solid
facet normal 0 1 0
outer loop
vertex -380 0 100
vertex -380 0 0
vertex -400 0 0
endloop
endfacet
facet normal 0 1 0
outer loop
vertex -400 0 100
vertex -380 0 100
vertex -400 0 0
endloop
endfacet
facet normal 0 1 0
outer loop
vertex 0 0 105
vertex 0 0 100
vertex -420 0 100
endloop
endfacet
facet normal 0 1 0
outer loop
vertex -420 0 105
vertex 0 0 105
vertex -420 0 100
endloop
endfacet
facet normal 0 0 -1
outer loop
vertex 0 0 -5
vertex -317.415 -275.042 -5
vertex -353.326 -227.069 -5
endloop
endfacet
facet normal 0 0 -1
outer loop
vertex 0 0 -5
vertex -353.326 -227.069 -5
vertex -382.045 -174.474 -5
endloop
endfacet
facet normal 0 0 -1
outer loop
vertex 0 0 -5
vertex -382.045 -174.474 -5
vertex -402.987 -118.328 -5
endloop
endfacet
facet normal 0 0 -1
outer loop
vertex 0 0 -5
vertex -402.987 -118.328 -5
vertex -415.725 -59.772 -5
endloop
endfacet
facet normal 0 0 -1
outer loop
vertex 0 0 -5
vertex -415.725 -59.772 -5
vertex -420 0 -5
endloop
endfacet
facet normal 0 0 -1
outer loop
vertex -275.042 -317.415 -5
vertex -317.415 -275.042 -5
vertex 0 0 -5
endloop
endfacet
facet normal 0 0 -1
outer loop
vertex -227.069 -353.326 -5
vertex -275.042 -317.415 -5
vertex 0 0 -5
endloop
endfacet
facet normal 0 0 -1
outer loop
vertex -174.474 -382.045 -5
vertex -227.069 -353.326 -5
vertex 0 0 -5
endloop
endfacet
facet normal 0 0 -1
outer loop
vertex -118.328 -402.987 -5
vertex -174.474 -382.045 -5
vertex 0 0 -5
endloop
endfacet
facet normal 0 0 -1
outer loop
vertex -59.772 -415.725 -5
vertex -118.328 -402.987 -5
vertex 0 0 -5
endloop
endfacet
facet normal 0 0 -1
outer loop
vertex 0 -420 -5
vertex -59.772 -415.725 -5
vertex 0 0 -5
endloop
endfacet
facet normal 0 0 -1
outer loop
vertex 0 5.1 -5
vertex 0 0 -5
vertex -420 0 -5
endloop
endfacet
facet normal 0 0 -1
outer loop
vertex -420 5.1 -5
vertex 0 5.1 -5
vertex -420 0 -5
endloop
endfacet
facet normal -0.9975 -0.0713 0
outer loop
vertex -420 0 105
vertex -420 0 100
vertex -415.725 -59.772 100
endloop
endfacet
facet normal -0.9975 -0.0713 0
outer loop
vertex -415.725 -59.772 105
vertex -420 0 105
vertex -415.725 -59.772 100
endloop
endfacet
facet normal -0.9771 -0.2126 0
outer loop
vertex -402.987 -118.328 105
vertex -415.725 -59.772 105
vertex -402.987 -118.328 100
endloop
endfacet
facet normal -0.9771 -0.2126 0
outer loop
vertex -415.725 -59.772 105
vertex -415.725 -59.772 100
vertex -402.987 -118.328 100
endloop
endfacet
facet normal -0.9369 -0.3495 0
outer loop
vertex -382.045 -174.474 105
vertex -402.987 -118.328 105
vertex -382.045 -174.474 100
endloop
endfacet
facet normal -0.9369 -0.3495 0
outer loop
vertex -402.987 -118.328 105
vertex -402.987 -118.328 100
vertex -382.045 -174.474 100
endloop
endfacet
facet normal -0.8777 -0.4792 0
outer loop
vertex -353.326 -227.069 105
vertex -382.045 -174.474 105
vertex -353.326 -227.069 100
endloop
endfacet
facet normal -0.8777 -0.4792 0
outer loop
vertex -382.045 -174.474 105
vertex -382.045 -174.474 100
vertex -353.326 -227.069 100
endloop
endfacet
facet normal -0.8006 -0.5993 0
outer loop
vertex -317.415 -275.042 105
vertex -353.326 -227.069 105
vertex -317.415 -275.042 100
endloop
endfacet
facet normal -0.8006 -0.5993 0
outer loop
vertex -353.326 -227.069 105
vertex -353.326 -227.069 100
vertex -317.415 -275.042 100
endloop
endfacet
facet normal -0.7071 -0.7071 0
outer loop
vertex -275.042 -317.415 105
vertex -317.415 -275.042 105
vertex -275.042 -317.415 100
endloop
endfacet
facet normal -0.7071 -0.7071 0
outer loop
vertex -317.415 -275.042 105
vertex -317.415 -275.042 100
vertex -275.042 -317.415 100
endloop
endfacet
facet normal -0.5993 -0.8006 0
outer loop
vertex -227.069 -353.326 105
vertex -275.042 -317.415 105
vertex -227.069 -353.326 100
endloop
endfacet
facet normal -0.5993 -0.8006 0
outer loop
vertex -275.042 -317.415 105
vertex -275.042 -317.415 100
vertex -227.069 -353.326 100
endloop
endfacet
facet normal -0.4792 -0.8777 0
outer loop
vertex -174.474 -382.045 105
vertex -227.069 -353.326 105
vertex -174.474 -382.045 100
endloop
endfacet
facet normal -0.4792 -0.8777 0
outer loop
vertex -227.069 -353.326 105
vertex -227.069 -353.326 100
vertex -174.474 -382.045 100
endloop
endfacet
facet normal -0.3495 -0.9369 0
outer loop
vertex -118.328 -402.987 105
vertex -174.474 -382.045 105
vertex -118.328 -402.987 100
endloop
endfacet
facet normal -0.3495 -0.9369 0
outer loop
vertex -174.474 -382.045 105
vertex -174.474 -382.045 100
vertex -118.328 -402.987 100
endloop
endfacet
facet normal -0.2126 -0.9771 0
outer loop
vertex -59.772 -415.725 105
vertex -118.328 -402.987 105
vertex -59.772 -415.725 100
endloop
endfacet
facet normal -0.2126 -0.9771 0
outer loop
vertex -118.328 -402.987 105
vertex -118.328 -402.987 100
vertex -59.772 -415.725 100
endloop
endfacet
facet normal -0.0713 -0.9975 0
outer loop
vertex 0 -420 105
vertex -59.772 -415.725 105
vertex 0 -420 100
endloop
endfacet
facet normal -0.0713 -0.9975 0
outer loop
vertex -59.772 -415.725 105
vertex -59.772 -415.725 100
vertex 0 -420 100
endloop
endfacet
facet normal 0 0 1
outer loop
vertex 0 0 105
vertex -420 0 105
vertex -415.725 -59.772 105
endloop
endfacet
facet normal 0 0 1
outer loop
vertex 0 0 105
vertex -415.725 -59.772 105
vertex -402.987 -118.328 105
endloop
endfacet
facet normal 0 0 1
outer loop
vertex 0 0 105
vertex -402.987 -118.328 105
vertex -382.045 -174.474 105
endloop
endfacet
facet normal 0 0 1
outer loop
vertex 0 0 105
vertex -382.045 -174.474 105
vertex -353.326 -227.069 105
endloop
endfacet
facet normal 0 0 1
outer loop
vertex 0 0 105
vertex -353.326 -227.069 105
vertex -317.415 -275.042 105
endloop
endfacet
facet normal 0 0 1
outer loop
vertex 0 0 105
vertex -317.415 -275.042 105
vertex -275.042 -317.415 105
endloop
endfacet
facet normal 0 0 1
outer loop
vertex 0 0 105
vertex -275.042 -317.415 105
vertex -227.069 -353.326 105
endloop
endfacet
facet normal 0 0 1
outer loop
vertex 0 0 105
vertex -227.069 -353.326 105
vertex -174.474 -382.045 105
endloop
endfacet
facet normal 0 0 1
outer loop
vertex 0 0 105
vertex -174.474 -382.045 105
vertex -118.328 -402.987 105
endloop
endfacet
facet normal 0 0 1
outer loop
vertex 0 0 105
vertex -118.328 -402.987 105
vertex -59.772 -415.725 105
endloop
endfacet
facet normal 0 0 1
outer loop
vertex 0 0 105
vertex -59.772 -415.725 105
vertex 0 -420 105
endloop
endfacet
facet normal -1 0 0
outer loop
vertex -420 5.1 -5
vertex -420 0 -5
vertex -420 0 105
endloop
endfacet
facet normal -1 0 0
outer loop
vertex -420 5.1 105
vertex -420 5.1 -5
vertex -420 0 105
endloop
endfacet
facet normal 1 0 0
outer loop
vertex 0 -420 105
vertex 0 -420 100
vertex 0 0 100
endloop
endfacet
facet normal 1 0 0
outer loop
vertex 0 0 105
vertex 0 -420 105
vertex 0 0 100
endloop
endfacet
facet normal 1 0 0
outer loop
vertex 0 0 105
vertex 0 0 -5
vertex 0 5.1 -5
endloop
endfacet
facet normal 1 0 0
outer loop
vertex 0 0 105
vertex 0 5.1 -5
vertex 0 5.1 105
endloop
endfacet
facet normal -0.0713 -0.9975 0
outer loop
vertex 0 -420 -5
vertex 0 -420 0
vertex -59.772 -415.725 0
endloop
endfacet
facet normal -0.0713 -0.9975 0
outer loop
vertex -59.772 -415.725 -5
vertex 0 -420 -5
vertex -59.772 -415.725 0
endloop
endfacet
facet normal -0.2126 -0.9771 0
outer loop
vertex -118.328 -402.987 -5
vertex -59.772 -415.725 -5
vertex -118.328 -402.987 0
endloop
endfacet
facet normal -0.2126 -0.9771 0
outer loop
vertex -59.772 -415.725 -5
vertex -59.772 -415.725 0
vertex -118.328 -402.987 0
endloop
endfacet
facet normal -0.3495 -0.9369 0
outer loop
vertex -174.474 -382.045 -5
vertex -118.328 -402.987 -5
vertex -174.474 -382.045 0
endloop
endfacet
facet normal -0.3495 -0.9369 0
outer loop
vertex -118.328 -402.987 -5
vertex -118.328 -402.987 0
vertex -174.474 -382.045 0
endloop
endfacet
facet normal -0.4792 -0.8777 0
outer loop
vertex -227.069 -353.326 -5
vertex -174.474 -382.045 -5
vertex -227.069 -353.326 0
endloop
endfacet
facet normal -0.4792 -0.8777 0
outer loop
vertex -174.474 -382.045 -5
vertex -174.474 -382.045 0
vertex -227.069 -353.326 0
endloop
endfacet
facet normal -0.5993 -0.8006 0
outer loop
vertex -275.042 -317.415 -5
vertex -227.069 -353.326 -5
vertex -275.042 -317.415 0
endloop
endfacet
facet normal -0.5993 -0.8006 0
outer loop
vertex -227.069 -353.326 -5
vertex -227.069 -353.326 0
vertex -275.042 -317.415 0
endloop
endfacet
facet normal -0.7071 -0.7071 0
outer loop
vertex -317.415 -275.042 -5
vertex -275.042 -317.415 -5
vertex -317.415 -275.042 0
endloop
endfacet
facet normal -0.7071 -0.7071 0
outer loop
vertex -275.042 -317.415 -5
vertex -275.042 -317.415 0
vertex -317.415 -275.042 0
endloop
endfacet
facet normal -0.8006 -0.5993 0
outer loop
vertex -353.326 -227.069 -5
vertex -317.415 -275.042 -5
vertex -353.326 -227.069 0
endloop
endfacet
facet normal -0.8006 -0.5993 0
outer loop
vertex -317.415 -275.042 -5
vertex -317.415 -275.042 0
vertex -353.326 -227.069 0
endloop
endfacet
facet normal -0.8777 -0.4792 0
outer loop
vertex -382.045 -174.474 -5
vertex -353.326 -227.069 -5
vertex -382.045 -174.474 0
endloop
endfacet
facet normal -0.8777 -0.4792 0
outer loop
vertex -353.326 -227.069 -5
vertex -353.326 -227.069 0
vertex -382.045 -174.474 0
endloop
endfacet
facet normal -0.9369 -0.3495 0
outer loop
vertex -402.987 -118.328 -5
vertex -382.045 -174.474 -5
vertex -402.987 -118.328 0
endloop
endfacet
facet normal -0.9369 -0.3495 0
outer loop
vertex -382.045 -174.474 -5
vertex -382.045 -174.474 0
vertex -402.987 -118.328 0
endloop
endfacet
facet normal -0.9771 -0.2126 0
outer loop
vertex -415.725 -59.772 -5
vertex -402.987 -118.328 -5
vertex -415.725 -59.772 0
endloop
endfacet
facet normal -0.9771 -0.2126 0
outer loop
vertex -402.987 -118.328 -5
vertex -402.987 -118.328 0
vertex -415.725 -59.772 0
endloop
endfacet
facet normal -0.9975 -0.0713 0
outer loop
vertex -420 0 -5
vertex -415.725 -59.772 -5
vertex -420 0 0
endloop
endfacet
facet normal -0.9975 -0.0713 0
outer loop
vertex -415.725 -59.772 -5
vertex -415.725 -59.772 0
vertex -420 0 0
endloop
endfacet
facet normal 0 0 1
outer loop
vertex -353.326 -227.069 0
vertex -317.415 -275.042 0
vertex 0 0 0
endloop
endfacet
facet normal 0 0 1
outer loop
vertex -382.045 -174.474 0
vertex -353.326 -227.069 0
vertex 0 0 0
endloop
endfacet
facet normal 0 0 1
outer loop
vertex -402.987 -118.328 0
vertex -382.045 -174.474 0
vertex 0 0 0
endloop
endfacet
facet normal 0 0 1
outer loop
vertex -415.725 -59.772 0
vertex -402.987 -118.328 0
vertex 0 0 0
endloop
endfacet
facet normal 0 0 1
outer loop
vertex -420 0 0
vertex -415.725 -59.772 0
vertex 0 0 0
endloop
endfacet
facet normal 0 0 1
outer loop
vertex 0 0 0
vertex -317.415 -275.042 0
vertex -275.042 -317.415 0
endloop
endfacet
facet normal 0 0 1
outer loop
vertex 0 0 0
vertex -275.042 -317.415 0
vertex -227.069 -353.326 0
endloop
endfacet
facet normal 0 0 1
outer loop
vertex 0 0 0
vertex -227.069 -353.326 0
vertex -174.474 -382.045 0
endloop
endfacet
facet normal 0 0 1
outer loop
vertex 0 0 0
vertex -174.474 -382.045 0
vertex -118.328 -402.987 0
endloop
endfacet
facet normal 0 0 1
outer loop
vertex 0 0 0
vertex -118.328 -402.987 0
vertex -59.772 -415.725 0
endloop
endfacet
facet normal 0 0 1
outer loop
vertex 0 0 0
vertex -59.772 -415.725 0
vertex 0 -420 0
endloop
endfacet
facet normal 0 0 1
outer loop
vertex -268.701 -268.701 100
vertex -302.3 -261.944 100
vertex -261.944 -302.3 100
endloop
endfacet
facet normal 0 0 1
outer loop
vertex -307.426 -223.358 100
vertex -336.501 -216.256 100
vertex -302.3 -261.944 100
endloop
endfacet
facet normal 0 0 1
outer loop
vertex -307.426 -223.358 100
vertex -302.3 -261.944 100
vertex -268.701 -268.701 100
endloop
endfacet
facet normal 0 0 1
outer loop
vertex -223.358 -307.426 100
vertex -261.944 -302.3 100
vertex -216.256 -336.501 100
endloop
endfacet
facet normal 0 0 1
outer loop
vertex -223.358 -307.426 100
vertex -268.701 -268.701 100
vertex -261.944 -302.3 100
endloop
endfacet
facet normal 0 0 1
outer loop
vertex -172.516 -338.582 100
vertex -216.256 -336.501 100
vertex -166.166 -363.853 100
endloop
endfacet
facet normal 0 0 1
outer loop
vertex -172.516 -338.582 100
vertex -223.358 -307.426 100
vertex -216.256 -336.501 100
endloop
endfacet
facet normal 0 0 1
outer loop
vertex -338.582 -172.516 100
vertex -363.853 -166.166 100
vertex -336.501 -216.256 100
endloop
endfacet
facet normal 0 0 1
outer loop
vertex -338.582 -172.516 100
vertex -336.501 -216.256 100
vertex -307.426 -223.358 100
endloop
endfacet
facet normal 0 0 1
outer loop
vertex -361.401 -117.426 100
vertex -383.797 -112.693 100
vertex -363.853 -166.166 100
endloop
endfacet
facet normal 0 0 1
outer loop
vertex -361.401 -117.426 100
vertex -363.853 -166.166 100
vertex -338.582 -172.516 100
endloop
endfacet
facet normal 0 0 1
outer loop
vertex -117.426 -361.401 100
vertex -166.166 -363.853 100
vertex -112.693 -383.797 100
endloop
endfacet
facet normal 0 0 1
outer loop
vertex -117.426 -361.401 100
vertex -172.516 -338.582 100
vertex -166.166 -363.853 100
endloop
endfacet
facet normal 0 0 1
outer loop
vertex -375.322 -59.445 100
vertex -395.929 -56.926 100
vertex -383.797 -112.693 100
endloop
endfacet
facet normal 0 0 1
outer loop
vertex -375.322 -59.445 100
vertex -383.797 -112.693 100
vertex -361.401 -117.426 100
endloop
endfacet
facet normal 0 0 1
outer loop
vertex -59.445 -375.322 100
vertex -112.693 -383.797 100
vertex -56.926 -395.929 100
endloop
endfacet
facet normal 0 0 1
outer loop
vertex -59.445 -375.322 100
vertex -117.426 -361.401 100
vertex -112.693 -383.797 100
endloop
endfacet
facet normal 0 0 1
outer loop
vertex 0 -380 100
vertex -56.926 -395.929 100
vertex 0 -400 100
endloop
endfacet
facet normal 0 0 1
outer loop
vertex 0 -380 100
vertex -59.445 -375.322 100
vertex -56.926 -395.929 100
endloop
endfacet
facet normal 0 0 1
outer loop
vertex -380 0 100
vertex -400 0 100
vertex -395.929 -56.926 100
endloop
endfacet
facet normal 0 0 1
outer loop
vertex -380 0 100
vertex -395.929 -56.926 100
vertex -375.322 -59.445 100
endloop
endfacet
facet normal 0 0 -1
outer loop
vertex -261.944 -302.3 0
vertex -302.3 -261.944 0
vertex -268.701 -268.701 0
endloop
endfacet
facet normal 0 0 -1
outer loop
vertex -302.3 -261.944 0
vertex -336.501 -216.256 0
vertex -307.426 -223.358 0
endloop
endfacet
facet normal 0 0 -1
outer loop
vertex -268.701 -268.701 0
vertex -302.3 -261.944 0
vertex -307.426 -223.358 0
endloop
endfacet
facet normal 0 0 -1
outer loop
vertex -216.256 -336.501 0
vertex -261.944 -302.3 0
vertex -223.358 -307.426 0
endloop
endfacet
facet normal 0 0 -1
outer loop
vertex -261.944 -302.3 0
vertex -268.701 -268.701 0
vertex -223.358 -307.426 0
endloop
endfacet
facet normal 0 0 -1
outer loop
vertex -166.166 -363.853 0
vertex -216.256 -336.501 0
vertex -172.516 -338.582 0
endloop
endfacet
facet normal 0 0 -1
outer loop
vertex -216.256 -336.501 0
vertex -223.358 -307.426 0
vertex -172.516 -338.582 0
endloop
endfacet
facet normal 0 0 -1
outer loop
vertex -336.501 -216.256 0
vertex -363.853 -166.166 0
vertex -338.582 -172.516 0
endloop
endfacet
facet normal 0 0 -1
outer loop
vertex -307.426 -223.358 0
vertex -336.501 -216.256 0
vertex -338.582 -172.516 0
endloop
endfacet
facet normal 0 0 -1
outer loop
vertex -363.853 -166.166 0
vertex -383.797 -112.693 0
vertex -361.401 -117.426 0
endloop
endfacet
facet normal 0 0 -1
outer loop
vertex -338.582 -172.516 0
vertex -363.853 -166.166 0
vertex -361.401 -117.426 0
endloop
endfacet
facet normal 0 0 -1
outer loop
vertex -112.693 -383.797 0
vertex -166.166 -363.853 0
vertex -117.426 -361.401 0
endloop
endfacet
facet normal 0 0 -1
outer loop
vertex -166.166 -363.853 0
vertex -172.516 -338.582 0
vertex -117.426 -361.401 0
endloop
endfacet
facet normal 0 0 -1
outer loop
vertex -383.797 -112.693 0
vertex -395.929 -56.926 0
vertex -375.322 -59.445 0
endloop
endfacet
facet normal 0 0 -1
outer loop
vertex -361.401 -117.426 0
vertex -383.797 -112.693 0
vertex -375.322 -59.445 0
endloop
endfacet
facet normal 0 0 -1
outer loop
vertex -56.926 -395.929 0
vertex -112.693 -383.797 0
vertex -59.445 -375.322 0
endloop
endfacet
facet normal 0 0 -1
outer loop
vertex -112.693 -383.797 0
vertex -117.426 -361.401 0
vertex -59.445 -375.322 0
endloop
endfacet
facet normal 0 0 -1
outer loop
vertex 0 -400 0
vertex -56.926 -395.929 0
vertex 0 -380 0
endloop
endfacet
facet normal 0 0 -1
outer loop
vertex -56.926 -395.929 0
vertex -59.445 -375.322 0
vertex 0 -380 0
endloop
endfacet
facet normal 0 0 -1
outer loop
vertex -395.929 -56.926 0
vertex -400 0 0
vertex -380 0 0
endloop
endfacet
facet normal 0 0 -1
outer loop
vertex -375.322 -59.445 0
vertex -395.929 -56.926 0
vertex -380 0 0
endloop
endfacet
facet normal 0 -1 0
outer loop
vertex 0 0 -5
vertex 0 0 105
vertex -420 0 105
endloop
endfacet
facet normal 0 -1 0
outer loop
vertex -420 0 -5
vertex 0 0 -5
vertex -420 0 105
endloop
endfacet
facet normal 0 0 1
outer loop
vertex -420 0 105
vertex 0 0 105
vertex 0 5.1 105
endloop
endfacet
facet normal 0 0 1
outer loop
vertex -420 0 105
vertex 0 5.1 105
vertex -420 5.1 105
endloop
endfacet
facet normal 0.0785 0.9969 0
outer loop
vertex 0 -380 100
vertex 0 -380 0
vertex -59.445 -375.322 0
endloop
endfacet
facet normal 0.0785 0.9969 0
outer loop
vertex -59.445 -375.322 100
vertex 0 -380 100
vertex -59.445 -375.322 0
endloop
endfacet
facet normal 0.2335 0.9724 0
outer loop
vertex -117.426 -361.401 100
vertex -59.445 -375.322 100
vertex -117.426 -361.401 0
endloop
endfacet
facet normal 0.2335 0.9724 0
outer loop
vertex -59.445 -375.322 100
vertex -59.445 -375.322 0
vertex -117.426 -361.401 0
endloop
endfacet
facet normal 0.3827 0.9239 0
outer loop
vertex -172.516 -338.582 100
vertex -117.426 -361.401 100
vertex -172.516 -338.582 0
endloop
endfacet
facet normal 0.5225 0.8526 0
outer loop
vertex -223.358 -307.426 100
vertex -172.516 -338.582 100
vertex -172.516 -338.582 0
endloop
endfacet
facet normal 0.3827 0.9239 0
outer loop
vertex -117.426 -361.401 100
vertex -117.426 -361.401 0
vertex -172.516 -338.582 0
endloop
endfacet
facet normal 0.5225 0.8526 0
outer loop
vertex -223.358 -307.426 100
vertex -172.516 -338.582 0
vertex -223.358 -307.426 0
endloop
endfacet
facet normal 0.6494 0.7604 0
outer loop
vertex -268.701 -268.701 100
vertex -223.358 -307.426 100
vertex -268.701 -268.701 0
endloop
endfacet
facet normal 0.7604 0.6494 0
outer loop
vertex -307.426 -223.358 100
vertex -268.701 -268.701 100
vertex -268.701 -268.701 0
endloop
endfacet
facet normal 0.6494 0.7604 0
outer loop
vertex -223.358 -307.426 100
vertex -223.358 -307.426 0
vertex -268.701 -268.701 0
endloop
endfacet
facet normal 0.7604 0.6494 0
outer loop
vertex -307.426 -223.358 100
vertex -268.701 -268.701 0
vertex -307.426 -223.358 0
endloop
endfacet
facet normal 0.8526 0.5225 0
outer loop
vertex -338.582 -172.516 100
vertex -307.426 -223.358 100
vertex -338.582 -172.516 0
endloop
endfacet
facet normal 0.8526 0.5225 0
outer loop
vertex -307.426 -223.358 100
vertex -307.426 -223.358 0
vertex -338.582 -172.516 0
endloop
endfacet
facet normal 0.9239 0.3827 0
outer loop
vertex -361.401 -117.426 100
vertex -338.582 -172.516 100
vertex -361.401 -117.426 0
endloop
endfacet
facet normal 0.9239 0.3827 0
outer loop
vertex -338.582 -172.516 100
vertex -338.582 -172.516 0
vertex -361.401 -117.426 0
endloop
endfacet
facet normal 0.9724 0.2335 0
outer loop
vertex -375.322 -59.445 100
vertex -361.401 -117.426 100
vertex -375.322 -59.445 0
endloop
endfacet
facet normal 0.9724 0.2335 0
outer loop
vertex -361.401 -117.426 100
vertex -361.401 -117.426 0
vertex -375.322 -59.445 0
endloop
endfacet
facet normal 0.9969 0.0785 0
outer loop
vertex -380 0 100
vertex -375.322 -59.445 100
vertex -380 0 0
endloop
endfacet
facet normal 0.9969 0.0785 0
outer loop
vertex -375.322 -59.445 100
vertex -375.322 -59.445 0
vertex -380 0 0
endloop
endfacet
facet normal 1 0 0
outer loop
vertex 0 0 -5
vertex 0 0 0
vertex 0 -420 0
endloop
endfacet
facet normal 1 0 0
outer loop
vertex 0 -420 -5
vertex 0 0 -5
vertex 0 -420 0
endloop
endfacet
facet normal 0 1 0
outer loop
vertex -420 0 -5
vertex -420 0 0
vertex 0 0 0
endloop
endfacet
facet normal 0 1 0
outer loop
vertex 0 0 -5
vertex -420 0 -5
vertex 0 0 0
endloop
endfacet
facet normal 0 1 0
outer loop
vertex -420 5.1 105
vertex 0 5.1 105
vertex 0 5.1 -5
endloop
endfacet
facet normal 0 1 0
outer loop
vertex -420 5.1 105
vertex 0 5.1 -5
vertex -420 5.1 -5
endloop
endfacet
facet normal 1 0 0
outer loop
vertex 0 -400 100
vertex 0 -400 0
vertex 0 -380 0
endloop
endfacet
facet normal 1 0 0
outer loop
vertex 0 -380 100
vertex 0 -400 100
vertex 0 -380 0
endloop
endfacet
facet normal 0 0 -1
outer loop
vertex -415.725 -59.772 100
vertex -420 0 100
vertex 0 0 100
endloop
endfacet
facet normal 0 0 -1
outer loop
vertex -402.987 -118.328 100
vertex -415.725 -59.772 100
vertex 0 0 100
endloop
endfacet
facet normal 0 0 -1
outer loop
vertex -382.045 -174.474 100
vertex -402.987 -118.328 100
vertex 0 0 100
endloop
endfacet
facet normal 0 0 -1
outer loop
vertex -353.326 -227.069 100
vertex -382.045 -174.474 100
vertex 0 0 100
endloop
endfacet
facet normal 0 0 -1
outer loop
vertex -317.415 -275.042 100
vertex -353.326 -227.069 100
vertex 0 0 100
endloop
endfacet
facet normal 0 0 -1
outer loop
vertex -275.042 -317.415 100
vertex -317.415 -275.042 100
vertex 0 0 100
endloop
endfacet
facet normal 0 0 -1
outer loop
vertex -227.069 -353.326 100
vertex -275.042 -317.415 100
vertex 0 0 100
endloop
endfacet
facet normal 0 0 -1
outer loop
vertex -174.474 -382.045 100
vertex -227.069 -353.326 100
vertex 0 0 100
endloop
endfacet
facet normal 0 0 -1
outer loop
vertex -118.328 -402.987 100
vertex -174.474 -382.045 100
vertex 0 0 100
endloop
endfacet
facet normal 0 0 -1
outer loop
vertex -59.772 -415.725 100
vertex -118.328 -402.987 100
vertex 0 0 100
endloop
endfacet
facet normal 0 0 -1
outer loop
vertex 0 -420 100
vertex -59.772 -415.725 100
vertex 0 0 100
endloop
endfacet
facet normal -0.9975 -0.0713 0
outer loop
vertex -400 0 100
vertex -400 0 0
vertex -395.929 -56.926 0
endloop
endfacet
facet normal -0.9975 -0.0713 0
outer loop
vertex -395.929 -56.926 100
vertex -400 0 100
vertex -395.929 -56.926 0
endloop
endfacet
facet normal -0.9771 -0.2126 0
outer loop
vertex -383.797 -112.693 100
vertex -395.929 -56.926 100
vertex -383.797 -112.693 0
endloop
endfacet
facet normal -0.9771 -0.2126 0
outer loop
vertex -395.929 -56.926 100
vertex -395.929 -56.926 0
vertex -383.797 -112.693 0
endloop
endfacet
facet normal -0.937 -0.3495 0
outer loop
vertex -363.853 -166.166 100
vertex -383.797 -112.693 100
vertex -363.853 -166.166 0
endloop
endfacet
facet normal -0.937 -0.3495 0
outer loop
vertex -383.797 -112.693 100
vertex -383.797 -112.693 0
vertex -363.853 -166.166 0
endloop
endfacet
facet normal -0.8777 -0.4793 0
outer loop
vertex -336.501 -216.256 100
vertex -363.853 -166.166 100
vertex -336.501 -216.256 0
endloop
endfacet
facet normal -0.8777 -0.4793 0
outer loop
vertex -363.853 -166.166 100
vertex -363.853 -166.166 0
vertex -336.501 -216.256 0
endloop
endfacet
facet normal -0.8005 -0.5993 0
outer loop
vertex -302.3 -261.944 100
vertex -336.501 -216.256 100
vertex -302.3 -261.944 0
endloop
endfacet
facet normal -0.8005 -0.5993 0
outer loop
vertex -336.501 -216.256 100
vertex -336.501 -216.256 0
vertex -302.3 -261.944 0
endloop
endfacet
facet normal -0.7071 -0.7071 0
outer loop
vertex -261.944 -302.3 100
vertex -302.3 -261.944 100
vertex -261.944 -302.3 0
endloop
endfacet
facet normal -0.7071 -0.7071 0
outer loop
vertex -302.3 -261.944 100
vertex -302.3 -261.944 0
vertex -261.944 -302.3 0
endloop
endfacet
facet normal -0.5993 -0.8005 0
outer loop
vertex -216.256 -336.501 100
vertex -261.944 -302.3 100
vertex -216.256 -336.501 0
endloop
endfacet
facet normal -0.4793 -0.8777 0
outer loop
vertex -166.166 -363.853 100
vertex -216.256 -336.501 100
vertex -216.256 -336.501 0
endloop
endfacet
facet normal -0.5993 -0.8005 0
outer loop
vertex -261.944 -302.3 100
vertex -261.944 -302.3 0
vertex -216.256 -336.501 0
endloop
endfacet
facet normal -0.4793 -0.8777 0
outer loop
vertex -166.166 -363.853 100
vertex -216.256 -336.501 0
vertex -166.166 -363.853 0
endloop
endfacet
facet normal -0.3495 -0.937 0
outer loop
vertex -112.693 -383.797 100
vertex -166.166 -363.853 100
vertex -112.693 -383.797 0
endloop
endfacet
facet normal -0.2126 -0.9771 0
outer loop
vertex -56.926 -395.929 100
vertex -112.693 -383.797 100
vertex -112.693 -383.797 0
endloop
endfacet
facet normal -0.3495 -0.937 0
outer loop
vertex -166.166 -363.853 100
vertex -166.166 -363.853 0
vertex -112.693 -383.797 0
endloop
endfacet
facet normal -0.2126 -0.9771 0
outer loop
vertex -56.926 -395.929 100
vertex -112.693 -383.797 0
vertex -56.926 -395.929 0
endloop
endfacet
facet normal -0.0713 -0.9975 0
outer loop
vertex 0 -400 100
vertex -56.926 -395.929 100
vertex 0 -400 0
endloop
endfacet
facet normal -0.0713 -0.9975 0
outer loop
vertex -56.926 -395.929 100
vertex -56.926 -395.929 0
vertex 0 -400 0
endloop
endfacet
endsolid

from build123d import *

# Parameters (mm, degrees)
F1_DEPTH  = 100
F4_DEPTH  = 5
F7_DEPTH  = 5
F9_W      = 420
F9_H      = 110
F10_DEPTH = 5.1


with BuildPart() as f1:
    # F0 (on Top) → F1 (new body)
    with BuildSketch(Plane.XY):
        with BuildLine():
            ThreePointArc((0, -380), (-268.7005768509, -268.7005768509), (-380, 0))
            Line((-380, 0), (-400, 0))
            ThreePointArc((-400, 0), (-282.8427124746, -282.8427124746), (0, -400))
            Line((0, -400), (0, -380))
        make_face()
    extrude(amount=F1_DEPTH)


with BuildPart() as f4:
    # F3 (on offset) → F4 (new body)
    with BuildSketch(Plane(origin=(0, 0, 0), x_dir=(1, 0, 0), z_dir=(0, 0, -1))):
        with BuildLine():
            Line((-400, 0), (0, 0))
            Line((0, 0), (0, 400))
            ThreePointArc((0, 400), (-282.8427124746, 282.8427124746), (-400, 0))
        make_face()
        with BuildLine():
            ThreePointArc((-400, 0), (-282.8427124746, 282.8427124746), (0, 400))
            Line((0, 400), (0, 420))
            ThreePointArc((0, 420), (-296.9848480984, 296.9848480984), (-420, 0))
            Line((-420, 0), (-400, 0))
        make_face()
    extrude(amount=F4_DEPTH)


with BuildPart() as f7:
    # F6 (on offset) → F7 (new body)
    with BuildSketch(Plane.XY.offset(100)):
        with BuildLine():
            Line((0, -420), (0, 0))
            Line((0, 0), (-420, 0))
            ThreePointArc((-420, 0), (-296.9848480984, -296.9848480984), (0, -420))
        make_face()
    extrude(amount=F7_DEPTH)


with BuildPart() as f10:
    # F9 (on offset) → F10 (new body)
    with BuildSketch(Plane(origin=(0, 0, 0), x_dir=(-1, 0, 0), z_dir=(0, 1, 0))):
        with Locations((210, 50)):
            Rectangle(F9_W, F9_H)
    extrude(amount=F10_DEPTH)


solid = Compound([f1.part, f4.part, f7.part, f10.part])
